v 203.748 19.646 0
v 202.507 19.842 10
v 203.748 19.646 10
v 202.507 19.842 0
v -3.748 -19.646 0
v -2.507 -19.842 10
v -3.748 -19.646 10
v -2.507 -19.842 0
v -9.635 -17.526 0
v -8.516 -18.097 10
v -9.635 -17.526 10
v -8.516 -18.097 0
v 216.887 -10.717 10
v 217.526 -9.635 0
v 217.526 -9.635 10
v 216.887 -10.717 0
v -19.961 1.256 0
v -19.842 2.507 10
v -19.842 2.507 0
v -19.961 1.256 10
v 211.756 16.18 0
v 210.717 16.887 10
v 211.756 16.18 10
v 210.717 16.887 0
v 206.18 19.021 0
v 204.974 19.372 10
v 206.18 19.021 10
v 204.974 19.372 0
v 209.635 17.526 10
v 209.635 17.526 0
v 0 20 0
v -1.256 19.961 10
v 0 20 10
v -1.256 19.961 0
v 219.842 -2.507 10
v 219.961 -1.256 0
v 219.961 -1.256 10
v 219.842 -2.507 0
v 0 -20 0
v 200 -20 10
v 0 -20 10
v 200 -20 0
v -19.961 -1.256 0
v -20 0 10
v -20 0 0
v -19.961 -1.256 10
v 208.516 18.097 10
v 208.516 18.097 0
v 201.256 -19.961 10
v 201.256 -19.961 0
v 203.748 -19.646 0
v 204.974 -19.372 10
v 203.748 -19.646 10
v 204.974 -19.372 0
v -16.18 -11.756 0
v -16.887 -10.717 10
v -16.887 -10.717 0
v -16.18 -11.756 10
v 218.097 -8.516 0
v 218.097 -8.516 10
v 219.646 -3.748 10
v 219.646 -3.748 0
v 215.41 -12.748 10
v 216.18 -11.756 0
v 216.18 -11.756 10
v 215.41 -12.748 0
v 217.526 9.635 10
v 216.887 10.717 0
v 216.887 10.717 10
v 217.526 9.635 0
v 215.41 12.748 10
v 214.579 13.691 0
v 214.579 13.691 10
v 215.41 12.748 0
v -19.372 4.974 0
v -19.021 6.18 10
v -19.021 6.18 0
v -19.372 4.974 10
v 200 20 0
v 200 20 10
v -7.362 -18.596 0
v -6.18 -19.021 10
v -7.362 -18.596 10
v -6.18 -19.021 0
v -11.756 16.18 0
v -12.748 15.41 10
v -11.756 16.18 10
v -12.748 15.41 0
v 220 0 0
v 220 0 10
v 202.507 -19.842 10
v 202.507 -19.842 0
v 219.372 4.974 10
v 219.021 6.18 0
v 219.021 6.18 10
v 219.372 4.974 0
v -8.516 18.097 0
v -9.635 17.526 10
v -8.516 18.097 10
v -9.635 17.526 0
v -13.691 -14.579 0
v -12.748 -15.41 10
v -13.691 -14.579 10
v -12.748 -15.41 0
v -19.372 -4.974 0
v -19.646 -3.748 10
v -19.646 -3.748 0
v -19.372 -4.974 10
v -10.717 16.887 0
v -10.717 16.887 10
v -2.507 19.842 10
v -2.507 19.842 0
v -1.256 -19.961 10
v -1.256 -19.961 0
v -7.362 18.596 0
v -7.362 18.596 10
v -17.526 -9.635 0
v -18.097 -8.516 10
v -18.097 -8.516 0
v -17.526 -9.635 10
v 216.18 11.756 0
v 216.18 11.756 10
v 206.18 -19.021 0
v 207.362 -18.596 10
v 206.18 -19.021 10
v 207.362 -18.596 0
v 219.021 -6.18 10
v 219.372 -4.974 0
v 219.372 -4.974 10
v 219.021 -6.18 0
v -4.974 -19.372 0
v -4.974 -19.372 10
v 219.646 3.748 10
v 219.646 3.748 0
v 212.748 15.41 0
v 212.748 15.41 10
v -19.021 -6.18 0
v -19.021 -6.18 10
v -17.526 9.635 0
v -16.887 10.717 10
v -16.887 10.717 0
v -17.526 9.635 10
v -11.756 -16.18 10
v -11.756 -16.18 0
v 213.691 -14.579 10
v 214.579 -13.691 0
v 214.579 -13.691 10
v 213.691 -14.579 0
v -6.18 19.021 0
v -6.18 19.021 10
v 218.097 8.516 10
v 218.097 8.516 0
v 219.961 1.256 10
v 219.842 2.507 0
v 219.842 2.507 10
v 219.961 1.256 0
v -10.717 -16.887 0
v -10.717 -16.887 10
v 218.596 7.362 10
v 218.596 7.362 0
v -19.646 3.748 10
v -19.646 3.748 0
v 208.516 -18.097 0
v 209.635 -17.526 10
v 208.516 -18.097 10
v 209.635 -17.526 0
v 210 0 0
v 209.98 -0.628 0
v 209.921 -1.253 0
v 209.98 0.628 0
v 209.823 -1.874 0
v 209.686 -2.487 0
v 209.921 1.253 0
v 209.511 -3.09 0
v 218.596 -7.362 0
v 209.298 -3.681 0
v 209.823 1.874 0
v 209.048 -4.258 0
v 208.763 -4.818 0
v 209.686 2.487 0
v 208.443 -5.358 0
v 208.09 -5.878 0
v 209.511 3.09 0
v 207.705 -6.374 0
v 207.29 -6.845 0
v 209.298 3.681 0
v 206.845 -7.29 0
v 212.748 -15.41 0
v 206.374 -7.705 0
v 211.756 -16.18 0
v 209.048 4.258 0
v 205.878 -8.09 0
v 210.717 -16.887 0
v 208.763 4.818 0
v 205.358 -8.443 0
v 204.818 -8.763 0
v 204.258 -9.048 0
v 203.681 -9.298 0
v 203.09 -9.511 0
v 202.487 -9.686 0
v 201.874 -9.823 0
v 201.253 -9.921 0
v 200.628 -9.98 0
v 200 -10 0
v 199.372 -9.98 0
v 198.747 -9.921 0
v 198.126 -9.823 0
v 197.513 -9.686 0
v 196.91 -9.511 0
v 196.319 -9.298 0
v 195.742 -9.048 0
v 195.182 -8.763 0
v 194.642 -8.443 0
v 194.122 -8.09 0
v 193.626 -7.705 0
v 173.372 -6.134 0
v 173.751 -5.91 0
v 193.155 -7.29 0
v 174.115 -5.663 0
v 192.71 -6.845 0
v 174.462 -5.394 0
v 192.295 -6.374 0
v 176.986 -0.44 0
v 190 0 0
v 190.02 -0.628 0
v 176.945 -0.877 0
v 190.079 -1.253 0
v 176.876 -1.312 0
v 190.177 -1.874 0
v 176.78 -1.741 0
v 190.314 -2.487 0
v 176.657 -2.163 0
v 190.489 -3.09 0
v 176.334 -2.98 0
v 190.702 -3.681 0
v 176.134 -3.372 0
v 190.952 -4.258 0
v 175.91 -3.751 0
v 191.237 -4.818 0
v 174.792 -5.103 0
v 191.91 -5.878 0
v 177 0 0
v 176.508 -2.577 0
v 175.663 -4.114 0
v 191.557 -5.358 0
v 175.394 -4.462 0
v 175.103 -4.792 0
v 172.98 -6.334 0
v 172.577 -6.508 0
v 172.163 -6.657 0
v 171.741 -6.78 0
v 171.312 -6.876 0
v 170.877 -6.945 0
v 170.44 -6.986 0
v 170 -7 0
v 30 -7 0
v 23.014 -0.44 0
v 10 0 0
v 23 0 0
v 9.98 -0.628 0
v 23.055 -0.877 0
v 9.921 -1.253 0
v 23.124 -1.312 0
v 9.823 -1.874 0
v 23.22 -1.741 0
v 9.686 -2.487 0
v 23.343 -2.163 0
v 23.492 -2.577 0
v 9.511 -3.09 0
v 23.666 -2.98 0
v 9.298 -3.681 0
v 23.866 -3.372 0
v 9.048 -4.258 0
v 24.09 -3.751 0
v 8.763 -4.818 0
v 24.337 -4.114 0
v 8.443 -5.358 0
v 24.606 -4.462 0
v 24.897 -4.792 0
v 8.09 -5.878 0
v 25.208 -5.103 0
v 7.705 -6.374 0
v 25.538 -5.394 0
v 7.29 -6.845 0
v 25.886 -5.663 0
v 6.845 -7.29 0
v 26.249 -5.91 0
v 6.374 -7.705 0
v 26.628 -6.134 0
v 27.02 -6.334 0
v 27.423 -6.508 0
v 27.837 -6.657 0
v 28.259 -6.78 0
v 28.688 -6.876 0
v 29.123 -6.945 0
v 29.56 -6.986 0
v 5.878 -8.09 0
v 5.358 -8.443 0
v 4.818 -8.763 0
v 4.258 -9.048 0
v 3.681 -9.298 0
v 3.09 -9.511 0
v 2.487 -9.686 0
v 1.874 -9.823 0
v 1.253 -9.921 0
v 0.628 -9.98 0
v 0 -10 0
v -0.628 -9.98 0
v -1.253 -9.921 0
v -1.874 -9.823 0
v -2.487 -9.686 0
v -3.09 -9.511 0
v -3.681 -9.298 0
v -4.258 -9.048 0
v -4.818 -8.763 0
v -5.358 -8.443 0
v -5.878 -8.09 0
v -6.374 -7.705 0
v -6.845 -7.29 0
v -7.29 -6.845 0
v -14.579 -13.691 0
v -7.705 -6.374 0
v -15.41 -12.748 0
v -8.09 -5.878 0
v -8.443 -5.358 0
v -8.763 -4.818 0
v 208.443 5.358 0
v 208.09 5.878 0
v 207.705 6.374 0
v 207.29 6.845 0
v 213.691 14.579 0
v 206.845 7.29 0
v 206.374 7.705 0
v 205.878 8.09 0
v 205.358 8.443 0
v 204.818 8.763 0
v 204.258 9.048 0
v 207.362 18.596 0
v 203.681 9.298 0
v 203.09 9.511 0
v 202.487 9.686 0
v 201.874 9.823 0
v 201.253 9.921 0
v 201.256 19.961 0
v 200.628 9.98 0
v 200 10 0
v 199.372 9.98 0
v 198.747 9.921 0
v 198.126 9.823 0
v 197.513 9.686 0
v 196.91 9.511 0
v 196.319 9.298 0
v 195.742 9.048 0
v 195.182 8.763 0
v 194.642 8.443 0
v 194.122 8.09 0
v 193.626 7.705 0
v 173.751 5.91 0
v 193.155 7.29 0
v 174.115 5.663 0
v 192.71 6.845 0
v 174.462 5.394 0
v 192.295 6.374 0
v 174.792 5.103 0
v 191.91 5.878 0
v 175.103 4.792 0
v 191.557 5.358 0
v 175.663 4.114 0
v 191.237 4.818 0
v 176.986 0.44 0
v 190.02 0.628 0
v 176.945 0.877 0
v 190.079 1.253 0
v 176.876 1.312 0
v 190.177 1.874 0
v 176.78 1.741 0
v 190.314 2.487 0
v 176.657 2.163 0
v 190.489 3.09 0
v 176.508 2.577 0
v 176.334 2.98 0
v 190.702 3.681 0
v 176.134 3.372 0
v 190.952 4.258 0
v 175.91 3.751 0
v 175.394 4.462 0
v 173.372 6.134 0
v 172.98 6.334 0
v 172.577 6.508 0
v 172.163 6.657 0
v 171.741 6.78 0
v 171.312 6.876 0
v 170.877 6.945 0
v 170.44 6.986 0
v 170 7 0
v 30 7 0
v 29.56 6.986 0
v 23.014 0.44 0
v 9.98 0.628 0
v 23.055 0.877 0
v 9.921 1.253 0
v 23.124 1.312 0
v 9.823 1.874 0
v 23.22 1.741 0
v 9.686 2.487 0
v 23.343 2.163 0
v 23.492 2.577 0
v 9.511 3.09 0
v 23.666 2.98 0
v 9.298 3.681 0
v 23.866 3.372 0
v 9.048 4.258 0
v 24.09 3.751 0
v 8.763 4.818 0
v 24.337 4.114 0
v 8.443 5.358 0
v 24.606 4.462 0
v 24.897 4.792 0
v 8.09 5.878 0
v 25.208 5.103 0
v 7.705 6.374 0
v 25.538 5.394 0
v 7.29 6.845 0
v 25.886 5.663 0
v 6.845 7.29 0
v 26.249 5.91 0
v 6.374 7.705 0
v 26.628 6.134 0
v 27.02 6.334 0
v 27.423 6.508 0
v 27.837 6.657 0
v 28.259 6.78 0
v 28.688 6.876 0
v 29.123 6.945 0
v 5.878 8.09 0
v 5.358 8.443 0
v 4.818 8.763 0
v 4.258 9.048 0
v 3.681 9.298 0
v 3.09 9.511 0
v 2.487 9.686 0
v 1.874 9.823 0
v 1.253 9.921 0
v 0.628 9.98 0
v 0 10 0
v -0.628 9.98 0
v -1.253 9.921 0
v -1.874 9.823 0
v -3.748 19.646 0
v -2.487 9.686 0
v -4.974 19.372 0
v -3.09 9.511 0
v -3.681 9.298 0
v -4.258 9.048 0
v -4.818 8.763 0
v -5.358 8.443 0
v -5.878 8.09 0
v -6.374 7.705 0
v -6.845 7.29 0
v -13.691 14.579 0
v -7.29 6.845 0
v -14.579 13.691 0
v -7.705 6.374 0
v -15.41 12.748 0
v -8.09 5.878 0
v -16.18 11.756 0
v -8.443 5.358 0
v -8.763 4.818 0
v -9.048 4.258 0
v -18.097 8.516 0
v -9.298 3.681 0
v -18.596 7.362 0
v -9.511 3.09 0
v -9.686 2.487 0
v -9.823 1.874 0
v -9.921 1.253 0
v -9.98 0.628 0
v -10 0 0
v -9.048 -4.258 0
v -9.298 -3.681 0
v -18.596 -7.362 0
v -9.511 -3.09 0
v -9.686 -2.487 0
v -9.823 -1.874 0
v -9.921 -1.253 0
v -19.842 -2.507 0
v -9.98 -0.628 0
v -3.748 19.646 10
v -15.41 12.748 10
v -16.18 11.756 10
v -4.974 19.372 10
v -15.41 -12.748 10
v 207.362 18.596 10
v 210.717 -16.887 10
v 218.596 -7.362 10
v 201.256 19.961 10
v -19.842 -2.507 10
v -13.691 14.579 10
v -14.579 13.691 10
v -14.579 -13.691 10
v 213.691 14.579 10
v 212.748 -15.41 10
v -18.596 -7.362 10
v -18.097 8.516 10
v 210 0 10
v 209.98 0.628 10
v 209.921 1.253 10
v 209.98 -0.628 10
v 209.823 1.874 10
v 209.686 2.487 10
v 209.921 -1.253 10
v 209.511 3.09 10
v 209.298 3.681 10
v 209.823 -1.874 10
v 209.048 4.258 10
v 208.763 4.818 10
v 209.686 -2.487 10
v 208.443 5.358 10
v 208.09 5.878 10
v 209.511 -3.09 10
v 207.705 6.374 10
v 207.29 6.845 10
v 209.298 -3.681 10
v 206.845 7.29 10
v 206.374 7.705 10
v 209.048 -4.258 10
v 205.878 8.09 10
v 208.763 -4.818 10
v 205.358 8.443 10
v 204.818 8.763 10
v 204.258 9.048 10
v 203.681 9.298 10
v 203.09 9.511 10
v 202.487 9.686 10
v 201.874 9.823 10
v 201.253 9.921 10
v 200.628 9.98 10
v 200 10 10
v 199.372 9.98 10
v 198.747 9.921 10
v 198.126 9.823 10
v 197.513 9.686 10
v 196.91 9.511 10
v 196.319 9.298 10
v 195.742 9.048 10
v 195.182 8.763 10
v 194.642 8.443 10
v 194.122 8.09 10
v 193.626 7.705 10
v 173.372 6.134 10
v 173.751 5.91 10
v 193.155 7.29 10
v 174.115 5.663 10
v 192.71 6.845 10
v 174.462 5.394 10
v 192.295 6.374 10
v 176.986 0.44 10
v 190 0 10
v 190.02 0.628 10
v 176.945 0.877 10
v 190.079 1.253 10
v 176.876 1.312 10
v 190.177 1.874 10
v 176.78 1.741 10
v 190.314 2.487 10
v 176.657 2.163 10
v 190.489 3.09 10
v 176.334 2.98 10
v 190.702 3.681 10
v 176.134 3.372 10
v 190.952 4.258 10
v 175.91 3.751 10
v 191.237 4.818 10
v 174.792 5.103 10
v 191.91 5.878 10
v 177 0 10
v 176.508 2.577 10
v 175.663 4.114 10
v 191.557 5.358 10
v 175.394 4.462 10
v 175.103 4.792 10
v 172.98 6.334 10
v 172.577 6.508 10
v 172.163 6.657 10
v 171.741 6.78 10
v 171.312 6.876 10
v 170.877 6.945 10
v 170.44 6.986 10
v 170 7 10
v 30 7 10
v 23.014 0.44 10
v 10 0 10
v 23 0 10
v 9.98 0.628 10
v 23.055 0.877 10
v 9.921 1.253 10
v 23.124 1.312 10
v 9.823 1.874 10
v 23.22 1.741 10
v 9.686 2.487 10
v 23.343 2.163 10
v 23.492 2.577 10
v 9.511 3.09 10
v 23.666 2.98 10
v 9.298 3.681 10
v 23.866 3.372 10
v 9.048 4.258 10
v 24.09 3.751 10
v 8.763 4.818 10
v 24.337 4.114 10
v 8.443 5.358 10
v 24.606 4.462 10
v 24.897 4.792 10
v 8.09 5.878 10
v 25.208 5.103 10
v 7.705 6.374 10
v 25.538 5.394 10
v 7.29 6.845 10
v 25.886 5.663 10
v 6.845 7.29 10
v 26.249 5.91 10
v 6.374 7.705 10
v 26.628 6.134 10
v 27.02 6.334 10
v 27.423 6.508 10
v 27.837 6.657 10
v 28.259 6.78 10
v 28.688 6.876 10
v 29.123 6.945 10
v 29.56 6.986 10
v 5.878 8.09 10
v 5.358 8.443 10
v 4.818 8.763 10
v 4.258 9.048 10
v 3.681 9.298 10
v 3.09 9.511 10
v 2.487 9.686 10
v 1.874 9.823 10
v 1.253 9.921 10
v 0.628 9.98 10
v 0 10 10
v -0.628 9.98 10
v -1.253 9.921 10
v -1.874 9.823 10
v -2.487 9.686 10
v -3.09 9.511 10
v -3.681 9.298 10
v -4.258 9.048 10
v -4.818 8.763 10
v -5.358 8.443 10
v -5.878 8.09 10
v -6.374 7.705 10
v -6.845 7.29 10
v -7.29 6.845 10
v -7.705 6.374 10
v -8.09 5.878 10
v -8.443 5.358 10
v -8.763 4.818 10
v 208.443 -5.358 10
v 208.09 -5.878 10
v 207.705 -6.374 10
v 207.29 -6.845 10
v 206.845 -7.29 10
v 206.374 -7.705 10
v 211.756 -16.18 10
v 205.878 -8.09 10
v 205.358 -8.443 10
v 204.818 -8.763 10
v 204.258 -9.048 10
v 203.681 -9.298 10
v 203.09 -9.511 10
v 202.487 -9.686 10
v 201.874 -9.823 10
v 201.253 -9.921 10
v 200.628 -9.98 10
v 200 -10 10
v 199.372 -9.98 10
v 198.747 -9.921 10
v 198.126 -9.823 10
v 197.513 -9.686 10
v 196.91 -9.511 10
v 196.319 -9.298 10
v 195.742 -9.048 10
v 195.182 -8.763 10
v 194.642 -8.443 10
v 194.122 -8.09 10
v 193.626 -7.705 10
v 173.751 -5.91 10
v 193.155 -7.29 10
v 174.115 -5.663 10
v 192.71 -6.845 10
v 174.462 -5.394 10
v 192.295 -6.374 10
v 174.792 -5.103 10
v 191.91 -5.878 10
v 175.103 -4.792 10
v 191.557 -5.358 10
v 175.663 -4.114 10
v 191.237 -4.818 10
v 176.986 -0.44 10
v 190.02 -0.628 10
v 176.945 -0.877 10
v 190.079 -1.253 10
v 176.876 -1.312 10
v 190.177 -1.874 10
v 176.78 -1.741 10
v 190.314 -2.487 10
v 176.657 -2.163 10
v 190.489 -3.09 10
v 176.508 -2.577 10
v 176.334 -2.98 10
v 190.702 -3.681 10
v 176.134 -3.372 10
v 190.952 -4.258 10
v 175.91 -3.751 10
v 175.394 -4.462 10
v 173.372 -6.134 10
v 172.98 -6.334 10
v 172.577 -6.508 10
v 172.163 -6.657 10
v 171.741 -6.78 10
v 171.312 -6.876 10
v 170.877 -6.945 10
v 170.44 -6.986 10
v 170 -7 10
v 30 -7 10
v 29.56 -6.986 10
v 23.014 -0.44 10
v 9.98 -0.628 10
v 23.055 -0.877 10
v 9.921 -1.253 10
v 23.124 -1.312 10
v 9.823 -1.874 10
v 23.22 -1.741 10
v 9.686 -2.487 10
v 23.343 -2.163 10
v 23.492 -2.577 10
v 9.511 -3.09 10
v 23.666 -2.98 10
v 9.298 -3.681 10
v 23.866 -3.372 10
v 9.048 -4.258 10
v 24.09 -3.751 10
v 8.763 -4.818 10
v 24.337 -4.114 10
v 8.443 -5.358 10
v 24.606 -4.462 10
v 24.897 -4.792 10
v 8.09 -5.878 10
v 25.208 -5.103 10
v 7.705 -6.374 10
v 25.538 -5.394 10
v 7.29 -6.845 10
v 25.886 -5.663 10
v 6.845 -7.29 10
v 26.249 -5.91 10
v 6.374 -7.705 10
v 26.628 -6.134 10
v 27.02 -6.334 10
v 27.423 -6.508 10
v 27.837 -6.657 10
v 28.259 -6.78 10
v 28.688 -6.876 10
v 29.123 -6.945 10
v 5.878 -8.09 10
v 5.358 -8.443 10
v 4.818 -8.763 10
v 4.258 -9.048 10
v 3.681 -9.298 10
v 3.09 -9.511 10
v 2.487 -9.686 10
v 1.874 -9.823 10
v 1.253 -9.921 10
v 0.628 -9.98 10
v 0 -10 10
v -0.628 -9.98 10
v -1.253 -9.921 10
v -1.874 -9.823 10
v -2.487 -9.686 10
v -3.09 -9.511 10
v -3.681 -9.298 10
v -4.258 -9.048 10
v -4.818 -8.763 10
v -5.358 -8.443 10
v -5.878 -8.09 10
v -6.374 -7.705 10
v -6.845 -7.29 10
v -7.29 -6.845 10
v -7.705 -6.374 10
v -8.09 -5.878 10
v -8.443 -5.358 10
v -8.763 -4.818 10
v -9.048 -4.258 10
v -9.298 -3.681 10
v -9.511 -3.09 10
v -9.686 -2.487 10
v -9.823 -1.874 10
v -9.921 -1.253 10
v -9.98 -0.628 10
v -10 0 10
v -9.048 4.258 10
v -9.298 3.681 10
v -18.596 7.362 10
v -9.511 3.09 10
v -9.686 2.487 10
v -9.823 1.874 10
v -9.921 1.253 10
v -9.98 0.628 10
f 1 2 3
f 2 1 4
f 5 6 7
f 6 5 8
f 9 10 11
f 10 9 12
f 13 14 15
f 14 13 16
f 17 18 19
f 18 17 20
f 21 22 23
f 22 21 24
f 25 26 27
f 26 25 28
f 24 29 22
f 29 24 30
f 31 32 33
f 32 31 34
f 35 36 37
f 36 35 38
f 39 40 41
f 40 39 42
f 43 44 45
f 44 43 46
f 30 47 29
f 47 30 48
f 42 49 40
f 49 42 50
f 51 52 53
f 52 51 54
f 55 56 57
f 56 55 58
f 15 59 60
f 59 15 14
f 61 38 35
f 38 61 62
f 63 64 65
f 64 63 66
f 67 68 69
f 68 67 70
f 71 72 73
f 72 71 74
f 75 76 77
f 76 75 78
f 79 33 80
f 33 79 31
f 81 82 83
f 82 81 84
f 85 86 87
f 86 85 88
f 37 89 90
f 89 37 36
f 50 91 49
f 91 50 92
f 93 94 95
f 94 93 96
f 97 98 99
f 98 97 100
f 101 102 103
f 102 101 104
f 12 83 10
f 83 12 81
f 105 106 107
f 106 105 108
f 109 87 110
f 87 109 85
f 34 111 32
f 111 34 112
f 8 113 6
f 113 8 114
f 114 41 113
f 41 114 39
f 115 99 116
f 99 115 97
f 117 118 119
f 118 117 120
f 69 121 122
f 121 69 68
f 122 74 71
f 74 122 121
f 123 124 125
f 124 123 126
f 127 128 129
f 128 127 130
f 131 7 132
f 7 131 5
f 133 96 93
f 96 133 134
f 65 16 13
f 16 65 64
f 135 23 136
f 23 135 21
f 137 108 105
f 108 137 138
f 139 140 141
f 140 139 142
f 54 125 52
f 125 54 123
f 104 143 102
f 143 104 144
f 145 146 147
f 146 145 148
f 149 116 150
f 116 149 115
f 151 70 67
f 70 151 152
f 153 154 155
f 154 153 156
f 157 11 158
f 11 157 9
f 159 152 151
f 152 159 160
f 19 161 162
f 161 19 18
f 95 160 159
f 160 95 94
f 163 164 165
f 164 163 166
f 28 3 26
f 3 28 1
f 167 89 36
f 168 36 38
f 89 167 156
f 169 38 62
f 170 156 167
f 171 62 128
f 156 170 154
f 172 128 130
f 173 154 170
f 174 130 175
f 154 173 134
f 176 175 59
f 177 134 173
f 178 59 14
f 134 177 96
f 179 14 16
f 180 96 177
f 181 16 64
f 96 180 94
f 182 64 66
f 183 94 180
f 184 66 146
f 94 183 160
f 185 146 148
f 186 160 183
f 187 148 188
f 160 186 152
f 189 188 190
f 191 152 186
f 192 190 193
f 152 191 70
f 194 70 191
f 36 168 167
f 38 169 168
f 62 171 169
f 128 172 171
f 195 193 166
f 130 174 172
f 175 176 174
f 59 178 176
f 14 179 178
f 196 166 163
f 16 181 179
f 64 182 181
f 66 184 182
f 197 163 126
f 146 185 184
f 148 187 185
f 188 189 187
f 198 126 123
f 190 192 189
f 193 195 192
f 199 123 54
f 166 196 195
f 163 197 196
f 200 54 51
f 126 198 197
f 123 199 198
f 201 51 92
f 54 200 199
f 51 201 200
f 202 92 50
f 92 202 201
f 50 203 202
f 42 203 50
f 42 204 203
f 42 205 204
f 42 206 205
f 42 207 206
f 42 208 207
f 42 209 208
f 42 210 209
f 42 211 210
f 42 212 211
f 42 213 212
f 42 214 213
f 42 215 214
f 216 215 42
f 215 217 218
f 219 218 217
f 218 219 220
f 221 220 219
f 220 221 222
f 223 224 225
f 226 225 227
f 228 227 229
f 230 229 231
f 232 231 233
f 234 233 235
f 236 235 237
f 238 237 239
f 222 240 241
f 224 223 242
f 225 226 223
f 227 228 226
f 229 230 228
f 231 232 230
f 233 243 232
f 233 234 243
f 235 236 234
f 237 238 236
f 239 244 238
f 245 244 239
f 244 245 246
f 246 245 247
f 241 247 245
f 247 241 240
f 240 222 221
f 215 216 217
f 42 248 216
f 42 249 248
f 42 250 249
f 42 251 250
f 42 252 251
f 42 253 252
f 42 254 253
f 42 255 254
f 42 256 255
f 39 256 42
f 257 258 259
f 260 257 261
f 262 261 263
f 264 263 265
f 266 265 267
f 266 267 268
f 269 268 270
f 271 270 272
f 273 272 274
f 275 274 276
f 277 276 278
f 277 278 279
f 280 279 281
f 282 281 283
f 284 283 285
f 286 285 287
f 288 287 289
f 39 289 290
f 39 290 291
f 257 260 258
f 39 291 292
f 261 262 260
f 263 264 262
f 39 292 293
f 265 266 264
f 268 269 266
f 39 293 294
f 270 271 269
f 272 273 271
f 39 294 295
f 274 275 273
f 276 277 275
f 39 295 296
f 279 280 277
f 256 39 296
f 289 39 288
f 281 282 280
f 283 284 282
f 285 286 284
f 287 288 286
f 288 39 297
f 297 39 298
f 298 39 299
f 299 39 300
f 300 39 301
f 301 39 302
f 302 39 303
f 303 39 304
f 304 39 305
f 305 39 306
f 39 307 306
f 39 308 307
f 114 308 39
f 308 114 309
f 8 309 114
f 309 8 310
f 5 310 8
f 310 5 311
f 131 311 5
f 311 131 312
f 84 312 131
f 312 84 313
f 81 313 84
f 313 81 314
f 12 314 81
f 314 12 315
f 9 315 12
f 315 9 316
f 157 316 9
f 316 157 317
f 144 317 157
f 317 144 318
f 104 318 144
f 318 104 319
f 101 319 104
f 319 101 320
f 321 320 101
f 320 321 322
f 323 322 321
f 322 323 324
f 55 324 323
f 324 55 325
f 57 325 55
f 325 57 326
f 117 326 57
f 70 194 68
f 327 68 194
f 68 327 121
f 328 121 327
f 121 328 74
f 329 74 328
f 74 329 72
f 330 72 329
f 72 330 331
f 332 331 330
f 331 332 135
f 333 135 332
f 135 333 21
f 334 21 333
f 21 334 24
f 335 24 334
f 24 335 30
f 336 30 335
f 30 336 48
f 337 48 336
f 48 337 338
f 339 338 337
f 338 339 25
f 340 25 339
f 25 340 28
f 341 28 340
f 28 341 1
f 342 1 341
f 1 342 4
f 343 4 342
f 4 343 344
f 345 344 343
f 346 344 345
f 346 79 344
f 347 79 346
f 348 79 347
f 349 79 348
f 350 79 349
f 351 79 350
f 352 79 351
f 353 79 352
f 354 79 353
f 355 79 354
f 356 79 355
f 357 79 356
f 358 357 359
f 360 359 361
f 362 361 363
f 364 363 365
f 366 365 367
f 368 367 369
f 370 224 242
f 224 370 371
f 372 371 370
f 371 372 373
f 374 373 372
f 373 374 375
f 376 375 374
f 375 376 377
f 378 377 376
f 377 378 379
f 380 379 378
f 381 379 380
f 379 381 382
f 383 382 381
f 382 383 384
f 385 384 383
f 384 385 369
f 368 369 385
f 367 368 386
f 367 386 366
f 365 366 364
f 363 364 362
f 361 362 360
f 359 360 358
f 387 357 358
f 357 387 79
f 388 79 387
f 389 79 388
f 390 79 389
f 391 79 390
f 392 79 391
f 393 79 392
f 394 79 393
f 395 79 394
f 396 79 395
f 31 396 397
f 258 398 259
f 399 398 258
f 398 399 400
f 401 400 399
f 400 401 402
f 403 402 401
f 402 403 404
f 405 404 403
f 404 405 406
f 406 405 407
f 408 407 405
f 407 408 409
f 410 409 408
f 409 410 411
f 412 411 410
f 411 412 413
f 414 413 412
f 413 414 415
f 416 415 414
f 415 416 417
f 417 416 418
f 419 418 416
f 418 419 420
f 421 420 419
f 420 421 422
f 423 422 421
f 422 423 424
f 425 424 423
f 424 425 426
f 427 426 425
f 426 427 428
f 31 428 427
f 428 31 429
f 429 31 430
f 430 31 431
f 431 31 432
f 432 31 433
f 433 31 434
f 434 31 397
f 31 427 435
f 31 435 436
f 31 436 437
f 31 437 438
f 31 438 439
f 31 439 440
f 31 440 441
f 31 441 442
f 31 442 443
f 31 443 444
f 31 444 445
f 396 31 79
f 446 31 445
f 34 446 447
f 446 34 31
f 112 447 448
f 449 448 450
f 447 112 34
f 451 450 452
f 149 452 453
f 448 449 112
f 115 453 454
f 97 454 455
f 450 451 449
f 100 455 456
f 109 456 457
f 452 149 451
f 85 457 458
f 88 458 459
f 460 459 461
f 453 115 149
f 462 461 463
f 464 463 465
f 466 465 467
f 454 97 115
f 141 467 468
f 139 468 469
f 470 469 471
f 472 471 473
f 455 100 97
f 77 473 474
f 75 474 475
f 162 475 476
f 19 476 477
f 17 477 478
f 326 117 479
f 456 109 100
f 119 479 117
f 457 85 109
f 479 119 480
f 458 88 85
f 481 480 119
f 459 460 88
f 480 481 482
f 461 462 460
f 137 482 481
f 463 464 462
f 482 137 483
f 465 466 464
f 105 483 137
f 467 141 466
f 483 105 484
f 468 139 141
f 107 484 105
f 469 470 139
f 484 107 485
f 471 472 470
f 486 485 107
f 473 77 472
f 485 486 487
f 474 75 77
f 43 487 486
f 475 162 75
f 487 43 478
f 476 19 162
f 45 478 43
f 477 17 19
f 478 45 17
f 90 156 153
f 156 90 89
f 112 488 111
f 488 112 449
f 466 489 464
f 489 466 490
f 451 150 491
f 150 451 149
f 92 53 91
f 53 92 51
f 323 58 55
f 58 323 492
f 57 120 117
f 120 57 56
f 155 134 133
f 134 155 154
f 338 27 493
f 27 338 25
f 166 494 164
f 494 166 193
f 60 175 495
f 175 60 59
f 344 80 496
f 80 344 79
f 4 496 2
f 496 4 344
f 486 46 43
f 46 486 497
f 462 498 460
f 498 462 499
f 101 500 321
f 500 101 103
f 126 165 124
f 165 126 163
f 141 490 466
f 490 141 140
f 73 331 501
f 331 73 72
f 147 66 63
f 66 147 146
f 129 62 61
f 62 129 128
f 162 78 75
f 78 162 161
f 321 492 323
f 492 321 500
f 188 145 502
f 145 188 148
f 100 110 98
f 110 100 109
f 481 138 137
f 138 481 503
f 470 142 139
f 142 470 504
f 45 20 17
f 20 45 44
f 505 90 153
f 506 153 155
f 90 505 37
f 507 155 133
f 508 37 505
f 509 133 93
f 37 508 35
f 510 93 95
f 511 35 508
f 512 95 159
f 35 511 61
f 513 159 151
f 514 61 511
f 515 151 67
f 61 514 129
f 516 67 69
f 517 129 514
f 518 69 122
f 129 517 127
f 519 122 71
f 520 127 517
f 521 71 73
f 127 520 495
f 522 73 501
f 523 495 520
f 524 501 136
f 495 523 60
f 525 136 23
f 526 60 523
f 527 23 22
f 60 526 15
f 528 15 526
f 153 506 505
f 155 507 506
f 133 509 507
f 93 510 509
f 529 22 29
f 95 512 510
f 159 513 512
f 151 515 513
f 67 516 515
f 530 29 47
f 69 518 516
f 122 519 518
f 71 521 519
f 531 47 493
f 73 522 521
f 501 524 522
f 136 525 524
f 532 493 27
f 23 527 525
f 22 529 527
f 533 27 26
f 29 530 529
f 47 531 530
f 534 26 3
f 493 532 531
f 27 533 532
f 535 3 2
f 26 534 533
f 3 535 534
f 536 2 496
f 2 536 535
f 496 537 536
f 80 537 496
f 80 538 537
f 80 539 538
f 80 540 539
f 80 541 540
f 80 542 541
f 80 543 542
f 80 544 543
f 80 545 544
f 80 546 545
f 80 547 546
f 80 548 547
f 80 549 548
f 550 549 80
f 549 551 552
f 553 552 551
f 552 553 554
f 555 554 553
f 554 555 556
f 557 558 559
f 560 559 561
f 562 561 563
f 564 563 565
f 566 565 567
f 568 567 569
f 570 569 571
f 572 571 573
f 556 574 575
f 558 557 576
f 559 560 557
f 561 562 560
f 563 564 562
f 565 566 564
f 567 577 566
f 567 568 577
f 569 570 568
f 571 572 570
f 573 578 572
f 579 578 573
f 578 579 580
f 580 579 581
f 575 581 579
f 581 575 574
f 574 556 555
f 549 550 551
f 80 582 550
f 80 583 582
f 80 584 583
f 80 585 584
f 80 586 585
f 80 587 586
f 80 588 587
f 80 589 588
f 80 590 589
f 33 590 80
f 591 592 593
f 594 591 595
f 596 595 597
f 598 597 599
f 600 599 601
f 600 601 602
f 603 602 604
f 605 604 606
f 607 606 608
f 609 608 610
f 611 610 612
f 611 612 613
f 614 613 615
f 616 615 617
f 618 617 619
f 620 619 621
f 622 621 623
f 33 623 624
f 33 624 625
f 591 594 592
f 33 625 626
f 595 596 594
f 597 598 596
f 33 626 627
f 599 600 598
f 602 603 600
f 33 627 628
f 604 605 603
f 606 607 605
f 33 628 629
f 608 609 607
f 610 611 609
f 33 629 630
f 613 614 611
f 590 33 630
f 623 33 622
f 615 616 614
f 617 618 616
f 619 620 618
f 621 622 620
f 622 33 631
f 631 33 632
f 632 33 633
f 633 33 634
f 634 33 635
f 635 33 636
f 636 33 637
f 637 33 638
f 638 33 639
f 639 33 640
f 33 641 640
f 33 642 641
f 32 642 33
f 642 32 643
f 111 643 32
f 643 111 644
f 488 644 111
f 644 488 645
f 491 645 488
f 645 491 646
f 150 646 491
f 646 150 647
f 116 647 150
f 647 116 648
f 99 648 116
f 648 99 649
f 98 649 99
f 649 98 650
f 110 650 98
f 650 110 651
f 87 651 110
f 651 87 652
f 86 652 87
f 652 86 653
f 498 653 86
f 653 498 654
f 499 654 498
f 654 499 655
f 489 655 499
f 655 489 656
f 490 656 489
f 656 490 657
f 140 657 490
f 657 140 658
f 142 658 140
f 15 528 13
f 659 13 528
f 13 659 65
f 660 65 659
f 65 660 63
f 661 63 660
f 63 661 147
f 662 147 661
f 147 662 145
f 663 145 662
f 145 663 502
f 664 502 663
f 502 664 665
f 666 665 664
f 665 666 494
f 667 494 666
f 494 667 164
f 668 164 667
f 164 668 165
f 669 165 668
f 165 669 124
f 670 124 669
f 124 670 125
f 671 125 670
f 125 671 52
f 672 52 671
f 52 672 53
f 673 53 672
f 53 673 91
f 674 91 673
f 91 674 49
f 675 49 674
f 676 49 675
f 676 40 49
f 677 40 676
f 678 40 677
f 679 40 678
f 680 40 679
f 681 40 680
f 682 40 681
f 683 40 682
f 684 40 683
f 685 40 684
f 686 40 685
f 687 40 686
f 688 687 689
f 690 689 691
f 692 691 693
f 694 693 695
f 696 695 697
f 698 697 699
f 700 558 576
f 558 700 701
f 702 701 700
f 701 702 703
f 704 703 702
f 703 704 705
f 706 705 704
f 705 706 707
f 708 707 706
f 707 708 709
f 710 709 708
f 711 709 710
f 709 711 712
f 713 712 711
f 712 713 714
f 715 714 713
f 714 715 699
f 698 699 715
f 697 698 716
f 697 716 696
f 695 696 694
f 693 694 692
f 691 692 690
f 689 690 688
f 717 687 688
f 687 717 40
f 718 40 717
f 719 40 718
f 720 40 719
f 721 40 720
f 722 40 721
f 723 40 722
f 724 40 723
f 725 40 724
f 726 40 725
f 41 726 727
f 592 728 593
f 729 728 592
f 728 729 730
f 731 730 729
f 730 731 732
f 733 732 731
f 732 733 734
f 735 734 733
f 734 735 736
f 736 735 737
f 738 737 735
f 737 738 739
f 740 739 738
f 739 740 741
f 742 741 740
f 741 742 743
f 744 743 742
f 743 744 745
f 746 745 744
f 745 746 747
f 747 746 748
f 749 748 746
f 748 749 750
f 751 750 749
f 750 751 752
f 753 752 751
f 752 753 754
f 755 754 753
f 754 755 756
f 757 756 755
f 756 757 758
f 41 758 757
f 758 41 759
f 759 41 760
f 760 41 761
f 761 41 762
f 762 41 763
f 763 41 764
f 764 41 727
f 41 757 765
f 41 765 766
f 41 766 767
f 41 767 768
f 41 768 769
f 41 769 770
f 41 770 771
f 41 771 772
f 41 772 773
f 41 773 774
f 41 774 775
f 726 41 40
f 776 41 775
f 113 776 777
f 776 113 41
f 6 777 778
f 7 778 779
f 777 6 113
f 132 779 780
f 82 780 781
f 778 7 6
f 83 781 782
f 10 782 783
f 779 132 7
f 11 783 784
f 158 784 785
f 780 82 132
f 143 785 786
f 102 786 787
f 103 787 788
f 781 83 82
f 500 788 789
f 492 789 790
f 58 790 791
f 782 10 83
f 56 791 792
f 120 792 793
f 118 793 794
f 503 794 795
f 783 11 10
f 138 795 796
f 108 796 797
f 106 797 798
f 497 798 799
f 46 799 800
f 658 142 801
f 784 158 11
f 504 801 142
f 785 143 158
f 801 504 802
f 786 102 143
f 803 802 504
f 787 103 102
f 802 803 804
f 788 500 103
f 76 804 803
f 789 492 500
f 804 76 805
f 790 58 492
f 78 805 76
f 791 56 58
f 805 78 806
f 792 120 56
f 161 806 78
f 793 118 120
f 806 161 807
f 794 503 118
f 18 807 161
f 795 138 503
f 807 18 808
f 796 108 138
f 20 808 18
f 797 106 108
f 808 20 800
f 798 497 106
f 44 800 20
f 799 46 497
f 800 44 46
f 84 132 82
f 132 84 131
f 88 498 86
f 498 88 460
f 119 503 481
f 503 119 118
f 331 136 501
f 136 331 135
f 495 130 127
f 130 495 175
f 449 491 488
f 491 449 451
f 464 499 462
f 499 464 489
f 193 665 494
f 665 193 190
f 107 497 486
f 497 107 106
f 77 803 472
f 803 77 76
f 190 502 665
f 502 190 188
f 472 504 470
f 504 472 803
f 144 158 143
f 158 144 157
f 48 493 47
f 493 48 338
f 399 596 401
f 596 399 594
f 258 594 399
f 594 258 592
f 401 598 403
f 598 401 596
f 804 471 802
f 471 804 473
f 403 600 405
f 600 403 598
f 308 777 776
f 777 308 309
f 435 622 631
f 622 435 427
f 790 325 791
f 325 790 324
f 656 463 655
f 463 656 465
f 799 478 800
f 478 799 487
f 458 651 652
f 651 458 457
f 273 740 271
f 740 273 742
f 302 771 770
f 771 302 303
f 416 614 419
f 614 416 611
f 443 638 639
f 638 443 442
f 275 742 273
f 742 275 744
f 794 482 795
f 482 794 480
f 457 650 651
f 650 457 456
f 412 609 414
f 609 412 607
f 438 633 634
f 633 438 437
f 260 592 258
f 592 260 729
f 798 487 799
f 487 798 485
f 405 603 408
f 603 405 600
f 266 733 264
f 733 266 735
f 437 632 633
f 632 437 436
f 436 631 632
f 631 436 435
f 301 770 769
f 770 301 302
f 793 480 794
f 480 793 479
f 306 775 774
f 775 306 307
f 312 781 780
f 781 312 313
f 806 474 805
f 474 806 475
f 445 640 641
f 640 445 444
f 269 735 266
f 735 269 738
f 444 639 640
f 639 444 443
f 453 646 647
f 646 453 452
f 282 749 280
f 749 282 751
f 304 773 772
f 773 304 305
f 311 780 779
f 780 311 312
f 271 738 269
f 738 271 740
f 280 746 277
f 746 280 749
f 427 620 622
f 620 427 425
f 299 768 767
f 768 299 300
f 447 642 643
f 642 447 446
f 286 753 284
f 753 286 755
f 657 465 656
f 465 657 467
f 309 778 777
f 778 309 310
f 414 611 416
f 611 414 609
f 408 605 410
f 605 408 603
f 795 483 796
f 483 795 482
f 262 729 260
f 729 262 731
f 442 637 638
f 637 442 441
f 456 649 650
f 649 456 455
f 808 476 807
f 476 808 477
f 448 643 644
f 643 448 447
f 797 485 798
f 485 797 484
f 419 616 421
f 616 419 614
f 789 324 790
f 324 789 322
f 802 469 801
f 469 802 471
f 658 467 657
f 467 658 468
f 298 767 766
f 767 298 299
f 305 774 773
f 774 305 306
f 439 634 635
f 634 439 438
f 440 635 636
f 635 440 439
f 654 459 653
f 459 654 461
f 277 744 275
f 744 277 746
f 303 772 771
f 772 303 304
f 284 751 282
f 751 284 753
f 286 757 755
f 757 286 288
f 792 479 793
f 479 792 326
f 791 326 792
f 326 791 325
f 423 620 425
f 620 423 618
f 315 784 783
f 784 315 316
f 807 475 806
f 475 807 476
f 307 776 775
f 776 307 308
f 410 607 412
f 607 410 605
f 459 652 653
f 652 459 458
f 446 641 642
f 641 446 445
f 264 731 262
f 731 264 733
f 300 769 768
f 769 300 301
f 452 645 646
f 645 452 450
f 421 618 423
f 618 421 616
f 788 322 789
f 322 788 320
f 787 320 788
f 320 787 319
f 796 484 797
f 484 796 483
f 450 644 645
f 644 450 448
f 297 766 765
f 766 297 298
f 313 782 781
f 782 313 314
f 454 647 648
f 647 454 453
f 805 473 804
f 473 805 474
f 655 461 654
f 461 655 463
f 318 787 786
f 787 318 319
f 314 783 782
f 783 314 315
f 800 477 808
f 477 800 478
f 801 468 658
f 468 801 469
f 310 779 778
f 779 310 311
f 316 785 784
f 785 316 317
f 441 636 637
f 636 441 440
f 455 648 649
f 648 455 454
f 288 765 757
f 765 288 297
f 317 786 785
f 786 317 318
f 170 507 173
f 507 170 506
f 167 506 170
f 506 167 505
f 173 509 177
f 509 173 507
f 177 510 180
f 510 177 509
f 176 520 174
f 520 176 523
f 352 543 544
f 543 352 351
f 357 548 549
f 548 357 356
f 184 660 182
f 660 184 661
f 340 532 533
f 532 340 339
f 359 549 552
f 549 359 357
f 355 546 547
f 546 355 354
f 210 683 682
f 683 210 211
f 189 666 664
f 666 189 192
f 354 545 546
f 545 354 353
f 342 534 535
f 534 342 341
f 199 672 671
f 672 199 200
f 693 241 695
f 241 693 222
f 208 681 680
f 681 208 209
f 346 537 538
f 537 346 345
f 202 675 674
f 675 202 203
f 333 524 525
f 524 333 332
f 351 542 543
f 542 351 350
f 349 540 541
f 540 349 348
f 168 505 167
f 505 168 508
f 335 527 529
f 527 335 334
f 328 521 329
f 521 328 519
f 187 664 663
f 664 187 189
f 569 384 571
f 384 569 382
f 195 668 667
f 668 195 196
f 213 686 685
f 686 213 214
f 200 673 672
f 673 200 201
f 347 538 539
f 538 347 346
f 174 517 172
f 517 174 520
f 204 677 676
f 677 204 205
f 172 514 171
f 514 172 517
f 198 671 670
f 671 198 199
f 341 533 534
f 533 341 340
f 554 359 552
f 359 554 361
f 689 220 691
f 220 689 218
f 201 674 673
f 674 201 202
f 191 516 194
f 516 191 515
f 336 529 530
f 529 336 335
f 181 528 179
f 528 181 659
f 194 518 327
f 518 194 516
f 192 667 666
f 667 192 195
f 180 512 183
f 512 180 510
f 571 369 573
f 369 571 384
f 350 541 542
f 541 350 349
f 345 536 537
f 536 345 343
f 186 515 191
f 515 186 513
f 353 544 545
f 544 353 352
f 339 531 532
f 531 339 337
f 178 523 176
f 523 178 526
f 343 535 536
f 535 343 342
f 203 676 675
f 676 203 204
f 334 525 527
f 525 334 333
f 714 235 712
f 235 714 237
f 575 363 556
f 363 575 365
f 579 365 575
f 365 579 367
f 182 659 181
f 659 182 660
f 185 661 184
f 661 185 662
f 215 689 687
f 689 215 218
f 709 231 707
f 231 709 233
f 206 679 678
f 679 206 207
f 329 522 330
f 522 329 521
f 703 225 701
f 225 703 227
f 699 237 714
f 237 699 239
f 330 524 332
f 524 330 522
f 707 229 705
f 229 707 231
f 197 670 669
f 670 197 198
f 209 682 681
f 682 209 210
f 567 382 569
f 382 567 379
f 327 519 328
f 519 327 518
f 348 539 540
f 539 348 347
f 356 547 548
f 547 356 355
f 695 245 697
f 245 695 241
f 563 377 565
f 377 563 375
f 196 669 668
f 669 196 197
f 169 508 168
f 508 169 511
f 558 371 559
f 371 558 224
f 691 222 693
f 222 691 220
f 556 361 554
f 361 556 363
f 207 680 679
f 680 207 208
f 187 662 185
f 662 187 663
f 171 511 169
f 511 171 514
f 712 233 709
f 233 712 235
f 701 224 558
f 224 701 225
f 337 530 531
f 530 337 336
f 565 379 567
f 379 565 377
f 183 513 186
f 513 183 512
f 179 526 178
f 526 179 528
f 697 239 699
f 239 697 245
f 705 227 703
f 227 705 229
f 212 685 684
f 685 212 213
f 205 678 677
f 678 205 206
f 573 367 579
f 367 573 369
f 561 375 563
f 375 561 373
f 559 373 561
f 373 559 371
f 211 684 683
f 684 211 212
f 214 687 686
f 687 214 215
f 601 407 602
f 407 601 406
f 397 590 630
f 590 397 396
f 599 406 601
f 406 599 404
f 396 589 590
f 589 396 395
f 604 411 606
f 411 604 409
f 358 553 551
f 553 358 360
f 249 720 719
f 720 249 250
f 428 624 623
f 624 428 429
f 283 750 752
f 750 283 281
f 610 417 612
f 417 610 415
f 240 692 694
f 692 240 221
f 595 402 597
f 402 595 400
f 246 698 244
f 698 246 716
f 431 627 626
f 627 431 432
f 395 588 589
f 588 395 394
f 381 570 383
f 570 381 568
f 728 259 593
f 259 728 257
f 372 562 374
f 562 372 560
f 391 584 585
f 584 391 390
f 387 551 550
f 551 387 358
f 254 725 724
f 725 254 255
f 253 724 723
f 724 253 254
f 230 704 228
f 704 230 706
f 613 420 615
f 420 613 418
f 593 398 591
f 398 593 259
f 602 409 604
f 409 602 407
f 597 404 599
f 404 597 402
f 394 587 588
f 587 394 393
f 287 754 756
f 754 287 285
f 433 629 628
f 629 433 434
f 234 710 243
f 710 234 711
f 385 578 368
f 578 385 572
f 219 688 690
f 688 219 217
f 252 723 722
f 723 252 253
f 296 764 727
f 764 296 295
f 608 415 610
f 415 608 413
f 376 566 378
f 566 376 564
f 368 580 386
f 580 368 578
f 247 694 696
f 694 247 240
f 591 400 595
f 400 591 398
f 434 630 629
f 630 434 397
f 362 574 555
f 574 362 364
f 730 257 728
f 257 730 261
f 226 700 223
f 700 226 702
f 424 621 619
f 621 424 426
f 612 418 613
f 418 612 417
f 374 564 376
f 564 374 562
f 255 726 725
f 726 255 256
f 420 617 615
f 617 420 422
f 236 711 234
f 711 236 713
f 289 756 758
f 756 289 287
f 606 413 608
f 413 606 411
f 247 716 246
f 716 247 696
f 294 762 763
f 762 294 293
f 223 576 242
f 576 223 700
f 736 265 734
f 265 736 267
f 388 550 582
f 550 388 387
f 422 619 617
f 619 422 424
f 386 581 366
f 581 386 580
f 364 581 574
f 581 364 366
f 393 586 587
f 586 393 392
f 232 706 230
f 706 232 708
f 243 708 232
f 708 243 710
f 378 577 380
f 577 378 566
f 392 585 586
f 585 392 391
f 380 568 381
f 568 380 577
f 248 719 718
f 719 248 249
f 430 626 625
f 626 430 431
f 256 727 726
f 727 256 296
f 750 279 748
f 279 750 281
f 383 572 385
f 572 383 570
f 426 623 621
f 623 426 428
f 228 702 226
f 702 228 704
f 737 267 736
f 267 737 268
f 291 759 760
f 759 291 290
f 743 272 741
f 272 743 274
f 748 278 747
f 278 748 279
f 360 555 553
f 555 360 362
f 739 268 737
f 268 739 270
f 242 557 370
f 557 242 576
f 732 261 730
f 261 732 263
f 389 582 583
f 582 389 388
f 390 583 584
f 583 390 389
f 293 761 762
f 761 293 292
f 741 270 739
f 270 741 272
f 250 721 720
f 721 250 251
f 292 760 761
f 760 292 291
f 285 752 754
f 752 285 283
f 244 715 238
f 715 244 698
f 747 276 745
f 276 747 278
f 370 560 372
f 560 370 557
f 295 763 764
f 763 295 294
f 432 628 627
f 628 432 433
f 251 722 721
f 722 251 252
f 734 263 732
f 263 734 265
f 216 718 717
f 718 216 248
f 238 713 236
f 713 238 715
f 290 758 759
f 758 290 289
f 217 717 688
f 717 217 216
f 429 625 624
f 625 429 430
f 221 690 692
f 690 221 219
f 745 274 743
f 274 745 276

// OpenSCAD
top_width = 20; //mm
top_hole = 10; //mm
bottom_width = 20; //mm
bottom_hole = 10; //mm
hole_distance = 200;
middle_hole_a = top_hole-(top_hole*0.3);
middle_hole_b = bottom_hole-(bottom_hole*0.3);
thickness = 10; //mm

difference() {
      hull() {translate([hole_distance,0,0]) cylinder (h=thickness, r=bottom_width, $fn=100);
      cylinder (h=thickness, r=top_width, $fn=100);
		}
	cylinder (h=thickness+1, r=top_hole, $fn=100);
	translate ([hole_distance,0,0]) cylinder (h=thickness+1, r=bottom_hole, $fn=100);
	translate ([(top_hole*2)+10,0,0]) hull() {translate([(hole_distance-bottom_hole*2)-((top_hole*2)+10)-10,0,0]) cylinder (h=thickness+1, r=middle_hole_b, $fn=100);
      cylinder (h=thickness+1, r=middle_hole_a, $fn=100);
	}
}
